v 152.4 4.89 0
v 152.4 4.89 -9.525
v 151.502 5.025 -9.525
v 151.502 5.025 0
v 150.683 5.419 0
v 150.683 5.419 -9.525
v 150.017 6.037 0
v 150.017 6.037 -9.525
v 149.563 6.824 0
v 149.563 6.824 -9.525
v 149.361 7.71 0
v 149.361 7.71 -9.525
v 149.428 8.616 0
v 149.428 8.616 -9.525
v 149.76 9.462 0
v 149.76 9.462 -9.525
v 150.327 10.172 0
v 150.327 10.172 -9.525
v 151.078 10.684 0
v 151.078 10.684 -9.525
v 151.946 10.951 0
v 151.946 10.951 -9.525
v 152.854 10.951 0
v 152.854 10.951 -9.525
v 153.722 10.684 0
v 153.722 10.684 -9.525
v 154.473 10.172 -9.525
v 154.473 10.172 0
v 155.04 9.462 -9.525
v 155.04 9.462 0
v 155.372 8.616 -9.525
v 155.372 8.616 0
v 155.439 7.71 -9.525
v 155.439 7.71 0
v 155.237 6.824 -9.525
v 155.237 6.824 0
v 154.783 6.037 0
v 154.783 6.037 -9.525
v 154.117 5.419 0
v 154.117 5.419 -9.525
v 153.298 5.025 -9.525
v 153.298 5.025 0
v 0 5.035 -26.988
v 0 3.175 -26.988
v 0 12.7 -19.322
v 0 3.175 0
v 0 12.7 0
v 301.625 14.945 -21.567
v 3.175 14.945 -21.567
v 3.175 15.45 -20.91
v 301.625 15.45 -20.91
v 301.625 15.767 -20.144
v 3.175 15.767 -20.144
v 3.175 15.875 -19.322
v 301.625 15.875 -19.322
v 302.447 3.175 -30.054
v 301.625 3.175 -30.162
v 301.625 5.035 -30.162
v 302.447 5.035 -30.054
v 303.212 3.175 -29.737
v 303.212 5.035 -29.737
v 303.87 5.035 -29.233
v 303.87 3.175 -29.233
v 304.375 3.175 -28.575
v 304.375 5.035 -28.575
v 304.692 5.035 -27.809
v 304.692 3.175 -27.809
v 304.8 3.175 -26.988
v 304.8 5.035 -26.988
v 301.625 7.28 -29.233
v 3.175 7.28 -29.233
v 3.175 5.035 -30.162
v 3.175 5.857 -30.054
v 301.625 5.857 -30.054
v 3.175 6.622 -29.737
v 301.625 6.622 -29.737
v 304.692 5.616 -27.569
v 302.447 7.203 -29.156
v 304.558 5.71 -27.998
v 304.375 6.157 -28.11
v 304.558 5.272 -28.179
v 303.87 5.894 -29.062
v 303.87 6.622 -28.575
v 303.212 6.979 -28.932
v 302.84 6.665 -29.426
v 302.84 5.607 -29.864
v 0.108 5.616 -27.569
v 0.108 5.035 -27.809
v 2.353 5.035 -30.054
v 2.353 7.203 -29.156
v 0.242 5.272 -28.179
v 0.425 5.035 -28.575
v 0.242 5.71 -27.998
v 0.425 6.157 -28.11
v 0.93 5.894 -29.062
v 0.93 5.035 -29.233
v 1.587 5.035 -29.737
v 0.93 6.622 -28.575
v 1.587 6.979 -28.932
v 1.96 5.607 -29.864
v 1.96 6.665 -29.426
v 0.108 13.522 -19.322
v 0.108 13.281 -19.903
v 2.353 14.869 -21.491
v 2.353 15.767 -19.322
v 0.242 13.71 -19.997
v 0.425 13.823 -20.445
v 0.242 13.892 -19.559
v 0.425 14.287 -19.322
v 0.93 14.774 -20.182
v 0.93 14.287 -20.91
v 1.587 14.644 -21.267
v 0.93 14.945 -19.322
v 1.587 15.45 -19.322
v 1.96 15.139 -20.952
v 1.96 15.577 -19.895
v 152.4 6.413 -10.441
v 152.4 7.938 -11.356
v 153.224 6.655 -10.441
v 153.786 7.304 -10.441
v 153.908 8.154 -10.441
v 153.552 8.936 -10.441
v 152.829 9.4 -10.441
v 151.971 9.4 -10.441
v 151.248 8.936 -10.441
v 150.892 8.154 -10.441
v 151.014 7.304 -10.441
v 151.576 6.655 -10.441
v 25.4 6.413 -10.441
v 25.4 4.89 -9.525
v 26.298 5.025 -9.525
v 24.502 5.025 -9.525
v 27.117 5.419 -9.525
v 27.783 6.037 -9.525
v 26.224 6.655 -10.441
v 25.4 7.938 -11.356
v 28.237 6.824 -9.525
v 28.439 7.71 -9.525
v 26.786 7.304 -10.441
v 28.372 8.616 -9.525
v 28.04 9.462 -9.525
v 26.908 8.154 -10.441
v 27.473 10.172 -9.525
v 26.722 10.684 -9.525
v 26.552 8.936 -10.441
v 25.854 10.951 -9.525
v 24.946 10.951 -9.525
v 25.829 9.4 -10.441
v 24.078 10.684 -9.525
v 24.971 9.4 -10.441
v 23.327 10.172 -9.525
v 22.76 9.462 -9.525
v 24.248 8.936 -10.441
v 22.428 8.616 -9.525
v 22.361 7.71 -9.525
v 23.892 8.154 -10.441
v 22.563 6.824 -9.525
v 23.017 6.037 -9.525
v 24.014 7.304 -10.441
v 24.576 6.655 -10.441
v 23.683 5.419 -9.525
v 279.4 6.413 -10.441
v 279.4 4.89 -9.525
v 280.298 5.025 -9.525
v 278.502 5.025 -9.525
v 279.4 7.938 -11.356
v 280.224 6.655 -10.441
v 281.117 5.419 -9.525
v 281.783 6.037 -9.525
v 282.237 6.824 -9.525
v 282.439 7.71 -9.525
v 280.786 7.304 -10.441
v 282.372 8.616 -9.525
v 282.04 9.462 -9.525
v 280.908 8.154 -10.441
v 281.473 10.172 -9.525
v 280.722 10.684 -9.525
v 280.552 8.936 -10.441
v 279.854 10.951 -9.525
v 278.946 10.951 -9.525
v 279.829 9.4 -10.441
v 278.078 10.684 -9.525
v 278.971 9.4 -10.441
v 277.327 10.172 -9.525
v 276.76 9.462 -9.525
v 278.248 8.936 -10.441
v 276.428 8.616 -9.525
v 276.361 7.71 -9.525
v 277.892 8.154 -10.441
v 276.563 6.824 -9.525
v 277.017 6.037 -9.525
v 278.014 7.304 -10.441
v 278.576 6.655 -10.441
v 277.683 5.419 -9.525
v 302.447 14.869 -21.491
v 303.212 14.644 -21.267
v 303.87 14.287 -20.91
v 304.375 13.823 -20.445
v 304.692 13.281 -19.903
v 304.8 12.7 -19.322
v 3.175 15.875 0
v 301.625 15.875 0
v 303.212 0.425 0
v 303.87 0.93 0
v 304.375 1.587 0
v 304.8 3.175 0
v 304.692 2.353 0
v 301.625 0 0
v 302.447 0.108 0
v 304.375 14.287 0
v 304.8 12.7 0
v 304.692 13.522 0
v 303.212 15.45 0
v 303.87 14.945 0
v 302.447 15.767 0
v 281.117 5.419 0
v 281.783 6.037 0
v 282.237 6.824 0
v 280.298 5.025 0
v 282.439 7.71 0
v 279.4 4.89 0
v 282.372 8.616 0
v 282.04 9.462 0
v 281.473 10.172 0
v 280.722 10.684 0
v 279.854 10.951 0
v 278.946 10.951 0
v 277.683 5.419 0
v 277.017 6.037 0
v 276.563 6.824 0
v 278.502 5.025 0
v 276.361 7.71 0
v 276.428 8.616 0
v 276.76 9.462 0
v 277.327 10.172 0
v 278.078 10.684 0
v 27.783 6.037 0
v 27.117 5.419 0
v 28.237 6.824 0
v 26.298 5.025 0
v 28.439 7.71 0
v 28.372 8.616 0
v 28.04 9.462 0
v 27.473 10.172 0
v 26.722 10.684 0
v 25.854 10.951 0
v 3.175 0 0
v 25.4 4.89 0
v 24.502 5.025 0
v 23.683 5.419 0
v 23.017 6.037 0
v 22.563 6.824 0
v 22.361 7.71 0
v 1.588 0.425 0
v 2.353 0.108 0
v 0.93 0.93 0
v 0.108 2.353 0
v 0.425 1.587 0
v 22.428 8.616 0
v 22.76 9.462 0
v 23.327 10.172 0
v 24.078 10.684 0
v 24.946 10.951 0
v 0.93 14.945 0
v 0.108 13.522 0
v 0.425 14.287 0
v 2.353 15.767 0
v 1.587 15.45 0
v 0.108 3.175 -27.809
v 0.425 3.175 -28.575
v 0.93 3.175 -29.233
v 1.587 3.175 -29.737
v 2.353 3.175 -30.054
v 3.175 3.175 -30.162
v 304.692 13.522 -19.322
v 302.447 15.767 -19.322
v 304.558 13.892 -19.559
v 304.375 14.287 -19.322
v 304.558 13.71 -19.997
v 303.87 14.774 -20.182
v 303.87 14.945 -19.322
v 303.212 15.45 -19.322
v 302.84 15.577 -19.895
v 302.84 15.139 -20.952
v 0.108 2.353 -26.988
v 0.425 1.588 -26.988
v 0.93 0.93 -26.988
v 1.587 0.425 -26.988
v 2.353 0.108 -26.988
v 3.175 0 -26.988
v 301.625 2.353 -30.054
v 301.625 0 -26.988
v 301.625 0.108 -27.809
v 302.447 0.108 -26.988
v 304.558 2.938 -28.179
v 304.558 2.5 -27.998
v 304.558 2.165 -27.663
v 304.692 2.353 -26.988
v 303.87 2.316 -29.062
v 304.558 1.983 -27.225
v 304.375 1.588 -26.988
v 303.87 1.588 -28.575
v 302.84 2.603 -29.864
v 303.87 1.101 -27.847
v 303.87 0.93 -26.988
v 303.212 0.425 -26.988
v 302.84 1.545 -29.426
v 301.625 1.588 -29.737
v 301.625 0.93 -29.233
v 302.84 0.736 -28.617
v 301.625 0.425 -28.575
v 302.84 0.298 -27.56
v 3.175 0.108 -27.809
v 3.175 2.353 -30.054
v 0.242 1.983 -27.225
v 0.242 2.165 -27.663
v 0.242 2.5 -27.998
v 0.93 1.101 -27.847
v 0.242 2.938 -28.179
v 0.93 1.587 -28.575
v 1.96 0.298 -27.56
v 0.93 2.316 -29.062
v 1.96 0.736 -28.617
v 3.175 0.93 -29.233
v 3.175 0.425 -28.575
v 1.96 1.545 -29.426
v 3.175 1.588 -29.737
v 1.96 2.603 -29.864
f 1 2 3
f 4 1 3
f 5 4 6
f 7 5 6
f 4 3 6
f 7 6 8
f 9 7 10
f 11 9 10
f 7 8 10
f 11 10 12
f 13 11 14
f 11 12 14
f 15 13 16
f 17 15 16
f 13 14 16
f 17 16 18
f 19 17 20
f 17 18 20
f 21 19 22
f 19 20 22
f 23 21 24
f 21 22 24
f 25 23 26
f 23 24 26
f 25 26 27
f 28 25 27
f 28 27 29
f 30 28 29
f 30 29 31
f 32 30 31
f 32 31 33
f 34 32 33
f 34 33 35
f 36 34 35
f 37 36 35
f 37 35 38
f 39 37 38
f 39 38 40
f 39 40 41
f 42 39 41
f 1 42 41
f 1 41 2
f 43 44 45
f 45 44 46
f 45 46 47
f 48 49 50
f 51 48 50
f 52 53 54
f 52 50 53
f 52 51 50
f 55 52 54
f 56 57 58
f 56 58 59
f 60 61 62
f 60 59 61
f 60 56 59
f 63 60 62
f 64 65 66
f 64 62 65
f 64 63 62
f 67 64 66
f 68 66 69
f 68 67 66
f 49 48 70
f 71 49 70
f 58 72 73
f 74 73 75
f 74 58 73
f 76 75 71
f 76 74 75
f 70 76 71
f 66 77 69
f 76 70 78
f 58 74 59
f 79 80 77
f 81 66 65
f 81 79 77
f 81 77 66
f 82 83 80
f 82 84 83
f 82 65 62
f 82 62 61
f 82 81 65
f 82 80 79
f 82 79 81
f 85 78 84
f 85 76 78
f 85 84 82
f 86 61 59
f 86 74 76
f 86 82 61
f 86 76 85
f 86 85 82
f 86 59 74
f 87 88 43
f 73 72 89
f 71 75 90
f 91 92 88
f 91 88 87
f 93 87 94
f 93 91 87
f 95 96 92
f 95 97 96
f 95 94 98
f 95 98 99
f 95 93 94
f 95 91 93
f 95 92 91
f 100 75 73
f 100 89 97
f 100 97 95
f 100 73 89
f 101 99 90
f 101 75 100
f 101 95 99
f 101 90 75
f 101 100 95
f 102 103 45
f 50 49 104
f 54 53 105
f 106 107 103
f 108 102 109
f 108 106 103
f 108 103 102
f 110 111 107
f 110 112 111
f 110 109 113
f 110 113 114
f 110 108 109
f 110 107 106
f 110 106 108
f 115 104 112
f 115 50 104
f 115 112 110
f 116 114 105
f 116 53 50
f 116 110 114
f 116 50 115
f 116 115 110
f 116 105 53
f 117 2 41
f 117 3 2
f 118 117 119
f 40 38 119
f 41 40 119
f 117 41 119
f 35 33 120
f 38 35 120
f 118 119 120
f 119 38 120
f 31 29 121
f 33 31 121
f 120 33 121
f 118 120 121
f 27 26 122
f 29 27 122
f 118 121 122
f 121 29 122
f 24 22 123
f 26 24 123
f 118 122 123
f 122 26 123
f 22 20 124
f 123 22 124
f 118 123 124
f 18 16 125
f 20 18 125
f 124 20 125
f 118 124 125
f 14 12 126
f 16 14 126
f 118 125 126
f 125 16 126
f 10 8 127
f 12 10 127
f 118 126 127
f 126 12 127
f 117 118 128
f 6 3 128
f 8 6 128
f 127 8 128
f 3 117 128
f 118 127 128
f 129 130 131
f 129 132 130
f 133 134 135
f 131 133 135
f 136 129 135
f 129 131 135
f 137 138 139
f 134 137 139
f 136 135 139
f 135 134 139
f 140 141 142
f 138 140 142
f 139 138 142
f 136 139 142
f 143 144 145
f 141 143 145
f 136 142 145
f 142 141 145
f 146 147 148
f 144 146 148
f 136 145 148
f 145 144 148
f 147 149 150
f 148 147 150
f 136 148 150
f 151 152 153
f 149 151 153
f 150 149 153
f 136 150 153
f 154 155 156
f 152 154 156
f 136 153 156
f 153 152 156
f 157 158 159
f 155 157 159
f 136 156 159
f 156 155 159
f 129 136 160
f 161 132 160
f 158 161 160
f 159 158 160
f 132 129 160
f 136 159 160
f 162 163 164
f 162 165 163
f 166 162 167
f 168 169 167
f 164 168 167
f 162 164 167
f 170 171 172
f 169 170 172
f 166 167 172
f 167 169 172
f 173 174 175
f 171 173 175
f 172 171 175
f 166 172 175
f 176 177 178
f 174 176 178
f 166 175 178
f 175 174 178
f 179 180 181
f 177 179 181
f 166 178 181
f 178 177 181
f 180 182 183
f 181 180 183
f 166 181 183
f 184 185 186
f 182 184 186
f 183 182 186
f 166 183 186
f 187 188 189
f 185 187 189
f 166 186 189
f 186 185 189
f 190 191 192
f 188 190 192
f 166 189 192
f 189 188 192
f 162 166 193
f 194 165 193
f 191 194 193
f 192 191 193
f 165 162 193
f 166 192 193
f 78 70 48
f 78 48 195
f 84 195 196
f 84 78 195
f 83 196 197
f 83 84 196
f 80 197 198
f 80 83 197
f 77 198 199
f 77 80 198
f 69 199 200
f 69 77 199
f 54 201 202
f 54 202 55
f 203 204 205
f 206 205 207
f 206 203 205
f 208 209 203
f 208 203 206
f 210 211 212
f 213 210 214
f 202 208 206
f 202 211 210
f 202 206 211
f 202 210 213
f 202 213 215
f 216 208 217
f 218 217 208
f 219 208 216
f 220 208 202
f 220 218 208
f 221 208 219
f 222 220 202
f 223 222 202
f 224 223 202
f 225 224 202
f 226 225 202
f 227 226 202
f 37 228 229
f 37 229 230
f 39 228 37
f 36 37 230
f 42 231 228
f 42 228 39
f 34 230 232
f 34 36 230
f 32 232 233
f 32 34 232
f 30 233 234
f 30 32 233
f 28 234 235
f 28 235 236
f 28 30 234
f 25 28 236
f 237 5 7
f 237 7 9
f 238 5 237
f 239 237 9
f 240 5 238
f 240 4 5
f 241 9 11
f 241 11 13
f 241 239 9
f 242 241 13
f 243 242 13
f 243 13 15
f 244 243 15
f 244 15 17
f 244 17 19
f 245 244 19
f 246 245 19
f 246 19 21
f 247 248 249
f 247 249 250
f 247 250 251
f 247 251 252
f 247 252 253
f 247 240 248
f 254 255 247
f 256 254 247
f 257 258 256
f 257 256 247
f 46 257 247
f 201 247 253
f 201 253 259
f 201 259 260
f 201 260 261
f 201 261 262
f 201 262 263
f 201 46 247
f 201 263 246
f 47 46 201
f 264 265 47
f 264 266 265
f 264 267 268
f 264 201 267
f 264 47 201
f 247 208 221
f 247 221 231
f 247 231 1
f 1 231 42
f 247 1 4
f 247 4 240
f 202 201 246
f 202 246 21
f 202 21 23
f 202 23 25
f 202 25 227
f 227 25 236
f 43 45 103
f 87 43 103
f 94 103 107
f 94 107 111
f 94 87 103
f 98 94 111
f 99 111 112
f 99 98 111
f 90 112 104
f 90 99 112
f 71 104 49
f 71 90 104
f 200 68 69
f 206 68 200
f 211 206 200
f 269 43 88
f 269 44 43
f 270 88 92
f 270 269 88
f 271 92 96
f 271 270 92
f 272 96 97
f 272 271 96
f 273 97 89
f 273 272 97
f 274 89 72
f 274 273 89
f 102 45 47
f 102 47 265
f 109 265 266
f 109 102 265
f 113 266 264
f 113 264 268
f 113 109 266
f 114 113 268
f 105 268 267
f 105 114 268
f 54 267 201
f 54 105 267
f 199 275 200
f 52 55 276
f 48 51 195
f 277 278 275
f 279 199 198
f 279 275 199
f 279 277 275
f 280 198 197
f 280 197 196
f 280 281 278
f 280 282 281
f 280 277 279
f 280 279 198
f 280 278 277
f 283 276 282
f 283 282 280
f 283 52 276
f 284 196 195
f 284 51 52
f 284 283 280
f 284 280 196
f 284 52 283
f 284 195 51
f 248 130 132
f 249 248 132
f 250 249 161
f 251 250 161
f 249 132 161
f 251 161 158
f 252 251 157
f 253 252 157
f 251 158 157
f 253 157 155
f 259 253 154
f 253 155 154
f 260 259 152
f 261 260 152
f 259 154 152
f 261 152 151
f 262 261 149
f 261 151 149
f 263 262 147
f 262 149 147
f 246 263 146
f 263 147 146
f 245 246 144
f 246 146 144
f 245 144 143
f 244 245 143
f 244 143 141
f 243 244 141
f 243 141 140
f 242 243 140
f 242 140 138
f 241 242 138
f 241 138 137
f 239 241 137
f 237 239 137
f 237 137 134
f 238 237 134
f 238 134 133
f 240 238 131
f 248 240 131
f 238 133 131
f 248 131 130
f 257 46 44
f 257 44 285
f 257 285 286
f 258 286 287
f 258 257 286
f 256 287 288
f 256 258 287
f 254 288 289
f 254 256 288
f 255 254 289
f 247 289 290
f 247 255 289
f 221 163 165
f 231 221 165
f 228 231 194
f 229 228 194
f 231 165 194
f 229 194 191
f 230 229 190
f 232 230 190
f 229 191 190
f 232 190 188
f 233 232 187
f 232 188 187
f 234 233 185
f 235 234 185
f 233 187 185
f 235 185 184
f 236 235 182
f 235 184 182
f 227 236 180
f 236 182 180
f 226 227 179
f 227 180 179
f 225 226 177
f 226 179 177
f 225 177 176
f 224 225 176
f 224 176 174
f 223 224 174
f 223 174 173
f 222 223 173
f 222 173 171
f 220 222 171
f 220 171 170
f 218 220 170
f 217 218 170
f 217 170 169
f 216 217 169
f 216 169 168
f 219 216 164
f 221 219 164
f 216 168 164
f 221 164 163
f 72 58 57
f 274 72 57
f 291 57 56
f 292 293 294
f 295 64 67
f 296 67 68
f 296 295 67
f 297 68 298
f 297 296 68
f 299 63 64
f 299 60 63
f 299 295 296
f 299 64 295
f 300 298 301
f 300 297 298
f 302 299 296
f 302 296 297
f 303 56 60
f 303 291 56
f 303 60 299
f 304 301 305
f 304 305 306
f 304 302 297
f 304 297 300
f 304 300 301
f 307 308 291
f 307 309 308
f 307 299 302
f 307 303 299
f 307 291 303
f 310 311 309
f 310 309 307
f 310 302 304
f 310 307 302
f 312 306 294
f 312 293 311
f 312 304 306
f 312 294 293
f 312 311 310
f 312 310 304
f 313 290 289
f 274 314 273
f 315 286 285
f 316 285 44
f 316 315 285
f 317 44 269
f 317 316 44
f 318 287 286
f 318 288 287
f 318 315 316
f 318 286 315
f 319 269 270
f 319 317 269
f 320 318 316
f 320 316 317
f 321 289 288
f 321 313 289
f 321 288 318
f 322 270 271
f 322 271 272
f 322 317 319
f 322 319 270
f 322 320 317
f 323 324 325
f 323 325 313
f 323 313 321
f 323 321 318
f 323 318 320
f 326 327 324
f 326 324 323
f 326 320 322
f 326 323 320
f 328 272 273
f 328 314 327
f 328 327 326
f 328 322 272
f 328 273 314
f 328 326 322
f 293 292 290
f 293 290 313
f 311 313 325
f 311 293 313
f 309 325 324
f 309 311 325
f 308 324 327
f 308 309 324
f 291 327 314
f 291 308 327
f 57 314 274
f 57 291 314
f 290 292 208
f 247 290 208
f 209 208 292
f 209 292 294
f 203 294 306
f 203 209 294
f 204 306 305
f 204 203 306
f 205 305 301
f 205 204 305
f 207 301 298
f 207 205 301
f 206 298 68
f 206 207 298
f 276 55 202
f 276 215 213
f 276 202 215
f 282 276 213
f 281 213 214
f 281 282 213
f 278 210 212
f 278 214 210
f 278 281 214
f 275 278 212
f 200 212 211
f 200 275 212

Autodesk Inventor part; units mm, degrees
ref_plane "YZ Plane" through (0, 0, 0) normal (1, 0, 0) x (0, 1, 0)
ref_plane "XZ Plane" through (0, 0, 0) normal (0, 1, 0) x (-1, 0, 0)
ref_plane "XY Plane" through (0, 0, 0) normal (0, 0, 1) x (1, 0, 0)
sketch "Sketch1" plane through (0, 0, 0) normal (1, 0, 0) x (0, 1, 0)
  line L0 (0, 0) -> (30.1625, 0)
  line L1 (30.1625, 0) -> (30.1625, -6.35)
  line L2 (30.1625, -6.35) -> (6.35, -30.1625)
  line L3 (6.35, -30.1625) -> (0, -30.1625)
  line L4 (0, -30.1625) -> (0, 0)
  line L5 (15.875, 0) -> (15.875, -20.6375)
  point P0 (15.0812, 0)
  dimension "d0" = 30.1625
  dimension "d1" = 6.35
  dimension "d16" = 15.875
extrude "Extrusion1" add sketch "Sketch1" along normal blind 304.8 contours L0 L5 L2 L3 L4
sketch "Sketch2" plane through (0, 0, 0) normal (0, 0, 1) x (1, 0, 0)
  line L0 (0, 15.875) -> (0, 0) projected
  line L1 (0, 0) -> (304.8, 0) projected
  point P0 (25.4, 7.9375)
  point P1 (152.4, 7.9375)
  point P2 (279.4, 7.9375)
  point P3 (152.4, 0)
  dimension "d4" = 25.4
  dimension "d5" = 7.9375
  dimension "d6" = 25.4
hole "Hole1" at (25.4, 7.9375, 0) at (152.4, 7.9375, 0) at (279.4, 7.9375, 0) direction (0, 0, -1) diameter 6.096 depth 9.525 tip angle 118
fillet "Fillet1" radius 3.175 11 edges at (152.4, 6.35, -30.1625) (152.4, 0, -30.1625) (0, 11.1125, -25.4) (0, 3.175, -30.1625) (0, 0, -15.0812) (304.8, 3.175, -30.1625) (304.8, 0, -15.0812) (304.8, 11.1125, -25.4) (152.4, 15.875, -20.6375) (304.8, 15.875, -10.3188) (0, 15.875, -10.3188)
properties part number "3DPRINT,BELT,GUARD" material "ABS Plastic"
